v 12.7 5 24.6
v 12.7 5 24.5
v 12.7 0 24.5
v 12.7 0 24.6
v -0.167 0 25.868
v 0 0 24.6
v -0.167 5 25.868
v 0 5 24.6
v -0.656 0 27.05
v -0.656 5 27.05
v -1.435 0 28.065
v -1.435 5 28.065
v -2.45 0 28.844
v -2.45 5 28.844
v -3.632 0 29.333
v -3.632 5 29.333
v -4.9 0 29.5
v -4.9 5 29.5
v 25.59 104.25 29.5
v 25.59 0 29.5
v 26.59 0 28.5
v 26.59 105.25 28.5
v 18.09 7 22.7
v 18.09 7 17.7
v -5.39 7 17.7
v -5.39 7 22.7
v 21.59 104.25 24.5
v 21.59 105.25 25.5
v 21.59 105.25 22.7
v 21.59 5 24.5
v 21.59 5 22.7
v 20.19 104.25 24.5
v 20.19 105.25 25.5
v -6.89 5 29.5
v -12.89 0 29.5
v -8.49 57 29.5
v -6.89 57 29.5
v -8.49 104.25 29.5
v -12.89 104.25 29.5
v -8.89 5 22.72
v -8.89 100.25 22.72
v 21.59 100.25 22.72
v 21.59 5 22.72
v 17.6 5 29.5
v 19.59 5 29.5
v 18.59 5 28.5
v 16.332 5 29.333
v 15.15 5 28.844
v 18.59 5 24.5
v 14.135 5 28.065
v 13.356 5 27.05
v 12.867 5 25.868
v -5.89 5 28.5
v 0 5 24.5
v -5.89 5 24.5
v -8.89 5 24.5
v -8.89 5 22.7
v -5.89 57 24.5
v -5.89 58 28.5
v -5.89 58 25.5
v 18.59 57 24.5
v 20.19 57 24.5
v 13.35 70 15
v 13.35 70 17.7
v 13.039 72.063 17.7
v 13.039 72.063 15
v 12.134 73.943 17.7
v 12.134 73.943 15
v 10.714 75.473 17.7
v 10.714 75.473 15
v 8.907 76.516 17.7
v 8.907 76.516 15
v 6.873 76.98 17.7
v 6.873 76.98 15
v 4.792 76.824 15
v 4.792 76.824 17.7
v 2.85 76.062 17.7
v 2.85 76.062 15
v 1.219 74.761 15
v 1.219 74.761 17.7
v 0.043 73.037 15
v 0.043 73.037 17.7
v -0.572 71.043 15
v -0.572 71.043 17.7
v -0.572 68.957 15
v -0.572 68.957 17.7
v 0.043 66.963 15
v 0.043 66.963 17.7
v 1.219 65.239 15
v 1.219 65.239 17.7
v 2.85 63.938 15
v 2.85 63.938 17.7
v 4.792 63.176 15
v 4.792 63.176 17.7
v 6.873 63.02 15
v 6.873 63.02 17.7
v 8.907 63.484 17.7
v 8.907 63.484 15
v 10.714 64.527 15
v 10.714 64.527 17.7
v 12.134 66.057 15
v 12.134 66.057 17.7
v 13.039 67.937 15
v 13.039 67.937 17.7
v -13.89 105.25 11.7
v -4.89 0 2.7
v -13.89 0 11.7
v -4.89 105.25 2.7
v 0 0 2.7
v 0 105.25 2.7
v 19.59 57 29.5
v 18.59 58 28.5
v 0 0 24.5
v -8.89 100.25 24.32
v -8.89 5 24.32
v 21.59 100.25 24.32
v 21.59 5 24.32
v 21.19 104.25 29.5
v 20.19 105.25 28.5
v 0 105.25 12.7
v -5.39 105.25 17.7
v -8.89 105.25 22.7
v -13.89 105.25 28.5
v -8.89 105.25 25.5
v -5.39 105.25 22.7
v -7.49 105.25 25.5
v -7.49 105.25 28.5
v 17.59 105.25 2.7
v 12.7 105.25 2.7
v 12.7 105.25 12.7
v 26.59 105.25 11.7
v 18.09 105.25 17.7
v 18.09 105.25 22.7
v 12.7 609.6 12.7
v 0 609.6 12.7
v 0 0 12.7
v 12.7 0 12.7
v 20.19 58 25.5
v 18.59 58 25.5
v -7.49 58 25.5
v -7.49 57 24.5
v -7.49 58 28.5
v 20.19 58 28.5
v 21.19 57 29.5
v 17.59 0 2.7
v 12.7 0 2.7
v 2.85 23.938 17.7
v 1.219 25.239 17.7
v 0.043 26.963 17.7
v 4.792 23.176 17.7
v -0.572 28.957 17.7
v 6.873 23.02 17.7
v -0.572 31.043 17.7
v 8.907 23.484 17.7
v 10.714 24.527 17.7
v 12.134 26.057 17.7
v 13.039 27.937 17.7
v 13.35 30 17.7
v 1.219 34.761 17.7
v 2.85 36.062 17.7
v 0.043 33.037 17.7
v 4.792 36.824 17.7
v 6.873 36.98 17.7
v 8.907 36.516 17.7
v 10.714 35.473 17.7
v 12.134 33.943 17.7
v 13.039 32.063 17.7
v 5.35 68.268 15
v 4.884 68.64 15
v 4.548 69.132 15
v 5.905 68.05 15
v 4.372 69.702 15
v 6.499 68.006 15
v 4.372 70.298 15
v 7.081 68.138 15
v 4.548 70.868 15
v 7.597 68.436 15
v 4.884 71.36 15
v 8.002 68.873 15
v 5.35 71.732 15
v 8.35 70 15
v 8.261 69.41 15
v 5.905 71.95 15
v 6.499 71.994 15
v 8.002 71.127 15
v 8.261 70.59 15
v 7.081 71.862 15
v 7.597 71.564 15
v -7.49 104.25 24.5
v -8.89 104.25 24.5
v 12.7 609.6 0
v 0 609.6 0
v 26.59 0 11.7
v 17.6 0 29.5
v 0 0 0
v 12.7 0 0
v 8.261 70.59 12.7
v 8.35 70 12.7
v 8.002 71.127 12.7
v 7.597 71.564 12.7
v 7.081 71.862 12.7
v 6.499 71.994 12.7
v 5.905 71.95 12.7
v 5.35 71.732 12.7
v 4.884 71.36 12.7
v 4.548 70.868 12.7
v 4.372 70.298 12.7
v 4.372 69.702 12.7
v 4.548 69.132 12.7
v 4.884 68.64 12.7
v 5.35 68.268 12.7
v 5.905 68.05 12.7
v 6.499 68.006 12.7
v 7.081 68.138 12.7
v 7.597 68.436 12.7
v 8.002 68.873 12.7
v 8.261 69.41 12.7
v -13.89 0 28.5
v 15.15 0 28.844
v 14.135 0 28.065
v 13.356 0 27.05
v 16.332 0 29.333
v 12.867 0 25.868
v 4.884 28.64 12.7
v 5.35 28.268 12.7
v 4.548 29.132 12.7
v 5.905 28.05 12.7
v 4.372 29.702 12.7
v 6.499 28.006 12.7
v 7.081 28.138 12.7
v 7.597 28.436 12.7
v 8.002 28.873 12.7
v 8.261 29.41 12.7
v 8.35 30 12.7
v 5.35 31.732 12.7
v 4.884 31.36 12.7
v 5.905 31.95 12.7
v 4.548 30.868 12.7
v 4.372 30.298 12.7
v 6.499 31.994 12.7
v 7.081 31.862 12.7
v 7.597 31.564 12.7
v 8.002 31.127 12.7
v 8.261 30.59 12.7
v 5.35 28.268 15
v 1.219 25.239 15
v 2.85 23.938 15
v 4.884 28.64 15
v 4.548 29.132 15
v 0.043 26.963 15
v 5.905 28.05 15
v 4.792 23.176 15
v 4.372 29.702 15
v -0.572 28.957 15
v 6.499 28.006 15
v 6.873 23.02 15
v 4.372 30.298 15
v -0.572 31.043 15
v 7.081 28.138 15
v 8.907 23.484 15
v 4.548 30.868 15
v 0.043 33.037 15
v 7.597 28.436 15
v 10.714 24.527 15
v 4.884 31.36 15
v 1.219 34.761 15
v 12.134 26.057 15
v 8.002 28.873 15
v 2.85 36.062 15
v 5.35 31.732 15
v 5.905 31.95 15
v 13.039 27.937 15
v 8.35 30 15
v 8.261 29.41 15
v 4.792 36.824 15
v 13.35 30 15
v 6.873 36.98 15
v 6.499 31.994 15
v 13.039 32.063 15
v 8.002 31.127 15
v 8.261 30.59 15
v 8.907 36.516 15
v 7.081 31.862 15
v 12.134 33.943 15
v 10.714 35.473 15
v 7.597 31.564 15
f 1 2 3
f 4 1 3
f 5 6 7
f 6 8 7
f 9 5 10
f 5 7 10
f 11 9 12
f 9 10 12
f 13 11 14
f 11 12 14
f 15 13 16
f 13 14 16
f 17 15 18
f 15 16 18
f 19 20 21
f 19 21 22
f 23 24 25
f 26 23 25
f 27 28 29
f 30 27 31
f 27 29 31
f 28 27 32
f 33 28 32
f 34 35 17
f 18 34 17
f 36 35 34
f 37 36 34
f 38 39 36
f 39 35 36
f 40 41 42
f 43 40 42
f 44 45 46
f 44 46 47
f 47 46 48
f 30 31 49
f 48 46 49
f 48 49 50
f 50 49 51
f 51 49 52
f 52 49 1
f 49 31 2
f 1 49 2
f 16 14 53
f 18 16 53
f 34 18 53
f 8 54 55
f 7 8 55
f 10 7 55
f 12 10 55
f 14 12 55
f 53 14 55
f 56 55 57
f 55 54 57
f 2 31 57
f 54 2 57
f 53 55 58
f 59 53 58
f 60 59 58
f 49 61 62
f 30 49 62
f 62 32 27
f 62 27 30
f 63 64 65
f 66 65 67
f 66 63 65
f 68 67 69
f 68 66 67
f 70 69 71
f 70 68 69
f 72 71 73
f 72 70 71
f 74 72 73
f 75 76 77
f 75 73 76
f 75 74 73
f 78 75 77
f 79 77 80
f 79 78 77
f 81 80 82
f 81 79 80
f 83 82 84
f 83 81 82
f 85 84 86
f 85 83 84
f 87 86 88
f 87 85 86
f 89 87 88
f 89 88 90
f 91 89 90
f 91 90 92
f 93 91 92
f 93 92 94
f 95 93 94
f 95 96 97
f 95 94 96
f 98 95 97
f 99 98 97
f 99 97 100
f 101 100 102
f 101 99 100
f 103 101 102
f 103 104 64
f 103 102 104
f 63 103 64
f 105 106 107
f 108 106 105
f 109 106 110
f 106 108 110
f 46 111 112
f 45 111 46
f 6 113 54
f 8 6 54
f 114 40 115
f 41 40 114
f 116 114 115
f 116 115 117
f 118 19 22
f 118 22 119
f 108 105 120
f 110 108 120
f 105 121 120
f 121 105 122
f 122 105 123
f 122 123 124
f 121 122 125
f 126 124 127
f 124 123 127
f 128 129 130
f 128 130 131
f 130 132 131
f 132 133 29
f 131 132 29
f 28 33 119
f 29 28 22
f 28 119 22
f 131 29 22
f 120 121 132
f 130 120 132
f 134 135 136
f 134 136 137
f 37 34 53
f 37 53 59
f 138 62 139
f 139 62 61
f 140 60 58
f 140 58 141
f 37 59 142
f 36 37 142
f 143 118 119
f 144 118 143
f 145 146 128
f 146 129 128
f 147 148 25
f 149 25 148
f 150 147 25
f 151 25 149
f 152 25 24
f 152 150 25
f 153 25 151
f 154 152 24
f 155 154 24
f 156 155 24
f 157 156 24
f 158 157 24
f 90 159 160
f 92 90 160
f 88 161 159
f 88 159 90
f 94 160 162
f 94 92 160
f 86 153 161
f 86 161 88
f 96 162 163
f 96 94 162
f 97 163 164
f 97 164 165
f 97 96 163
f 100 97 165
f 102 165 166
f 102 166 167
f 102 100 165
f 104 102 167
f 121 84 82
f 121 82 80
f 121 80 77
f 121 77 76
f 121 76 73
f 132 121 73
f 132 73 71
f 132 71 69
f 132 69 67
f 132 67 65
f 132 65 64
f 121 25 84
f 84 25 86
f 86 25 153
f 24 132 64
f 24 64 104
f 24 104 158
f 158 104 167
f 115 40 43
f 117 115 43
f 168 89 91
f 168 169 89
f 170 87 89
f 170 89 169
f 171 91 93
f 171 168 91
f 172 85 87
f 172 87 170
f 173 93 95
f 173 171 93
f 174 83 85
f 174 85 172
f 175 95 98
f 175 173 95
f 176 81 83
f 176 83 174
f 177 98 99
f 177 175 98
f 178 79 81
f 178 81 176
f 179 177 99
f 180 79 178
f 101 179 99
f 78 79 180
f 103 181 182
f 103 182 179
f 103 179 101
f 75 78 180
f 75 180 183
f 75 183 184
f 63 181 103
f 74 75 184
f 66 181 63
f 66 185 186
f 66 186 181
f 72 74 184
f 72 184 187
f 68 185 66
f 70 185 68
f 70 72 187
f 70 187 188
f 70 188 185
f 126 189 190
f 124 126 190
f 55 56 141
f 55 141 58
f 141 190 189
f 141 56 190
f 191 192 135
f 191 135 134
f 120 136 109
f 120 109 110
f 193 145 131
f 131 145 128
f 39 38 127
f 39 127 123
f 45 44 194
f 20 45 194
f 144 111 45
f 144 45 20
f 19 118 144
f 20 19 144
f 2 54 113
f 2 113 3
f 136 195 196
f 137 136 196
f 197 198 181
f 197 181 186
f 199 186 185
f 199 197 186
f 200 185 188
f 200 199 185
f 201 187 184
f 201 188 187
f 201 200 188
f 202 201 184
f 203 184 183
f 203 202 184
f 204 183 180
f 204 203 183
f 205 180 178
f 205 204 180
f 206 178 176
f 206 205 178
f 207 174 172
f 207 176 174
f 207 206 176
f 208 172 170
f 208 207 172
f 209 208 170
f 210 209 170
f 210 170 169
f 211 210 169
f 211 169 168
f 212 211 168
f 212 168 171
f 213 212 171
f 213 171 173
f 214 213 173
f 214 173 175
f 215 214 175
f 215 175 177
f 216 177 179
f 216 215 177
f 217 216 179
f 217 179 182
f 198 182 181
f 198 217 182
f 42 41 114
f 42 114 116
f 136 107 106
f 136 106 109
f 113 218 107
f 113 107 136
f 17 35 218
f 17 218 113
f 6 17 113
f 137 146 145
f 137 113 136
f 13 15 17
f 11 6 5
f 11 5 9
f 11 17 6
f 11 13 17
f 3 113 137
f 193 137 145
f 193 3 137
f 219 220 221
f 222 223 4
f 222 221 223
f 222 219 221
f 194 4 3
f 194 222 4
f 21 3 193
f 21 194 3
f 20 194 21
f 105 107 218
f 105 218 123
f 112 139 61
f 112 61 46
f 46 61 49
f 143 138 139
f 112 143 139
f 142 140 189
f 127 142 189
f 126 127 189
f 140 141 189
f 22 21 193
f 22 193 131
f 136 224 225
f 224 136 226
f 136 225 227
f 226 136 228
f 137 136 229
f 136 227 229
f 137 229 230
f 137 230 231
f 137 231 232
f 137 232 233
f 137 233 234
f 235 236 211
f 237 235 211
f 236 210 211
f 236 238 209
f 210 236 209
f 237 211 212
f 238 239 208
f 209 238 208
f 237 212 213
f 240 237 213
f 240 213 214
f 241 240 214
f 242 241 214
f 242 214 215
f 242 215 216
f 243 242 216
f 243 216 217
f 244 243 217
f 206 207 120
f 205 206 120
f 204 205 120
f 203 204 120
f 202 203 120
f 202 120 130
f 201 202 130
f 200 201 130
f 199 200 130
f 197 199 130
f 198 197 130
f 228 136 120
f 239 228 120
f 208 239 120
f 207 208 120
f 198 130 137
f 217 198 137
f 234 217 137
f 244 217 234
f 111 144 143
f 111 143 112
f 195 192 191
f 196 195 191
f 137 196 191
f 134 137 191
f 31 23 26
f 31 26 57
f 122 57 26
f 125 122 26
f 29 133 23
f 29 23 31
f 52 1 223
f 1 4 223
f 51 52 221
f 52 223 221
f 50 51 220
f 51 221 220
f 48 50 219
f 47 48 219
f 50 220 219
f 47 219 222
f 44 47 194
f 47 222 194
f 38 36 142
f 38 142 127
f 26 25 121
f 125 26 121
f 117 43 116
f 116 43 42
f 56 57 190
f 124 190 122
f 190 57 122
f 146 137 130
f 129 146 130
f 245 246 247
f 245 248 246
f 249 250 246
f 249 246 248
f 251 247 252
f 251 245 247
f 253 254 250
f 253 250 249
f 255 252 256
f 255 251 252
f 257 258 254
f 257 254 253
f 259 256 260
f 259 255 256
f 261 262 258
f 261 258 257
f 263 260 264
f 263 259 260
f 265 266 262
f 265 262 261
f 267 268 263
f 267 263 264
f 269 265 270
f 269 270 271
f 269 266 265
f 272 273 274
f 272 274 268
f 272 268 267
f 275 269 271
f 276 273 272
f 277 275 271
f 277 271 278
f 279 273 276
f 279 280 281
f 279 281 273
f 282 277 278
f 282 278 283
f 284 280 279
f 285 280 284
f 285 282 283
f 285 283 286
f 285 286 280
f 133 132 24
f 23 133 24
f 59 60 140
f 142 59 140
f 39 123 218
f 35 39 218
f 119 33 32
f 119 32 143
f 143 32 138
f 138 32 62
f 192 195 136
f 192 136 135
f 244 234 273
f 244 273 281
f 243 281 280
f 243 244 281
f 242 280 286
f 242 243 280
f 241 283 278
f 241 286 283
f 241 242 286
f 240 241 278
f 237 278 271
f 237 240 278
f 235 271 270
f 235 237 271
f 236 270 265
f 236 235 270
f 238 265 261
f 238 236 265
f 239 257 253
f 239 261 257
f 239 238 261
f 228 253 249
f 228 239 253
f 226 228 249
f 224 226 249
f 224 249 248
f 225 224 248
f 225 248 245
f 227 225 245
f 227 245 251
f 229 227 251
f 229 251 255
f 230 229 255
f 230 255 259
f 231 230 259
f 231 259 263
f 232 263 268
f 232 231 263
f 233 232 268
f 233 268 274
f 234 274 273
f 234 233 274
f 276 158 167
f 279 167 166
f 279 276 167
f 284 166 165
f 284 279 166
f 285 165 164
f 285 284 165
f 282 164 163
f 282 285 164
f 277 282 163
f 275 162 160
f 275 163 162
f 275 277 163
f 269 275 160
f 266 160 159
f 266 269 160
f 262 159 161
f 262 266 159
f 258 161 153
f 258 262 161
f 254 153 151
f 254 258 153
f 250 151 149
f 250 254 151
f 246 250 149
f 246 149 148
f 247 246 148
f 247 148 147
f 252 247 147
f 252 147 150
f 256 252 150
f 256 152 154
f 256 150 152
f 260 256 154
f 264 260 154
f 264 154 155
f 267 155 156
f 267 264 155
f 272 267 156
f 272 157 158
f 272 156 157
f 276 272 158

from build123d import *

# Parameters (mm, degrees)
BOX_W             = 12.7
BOX_H             = 609.6
BOX_DEPTH         = 12.7
BOX001_W          = 30.48
BOX001_H          = 95.25
BOX001_DEPTH      = 1.6
CYLINDER002_R     = 7
CYLINDER002_DEPTH = 3
CYLINDER003_R     = 7
CYLINDER003_DEPTH = 3
CYLINDER001_R     = 2
CYLINDER001_DEPTH = 10
CYLINDER_R        = 2
CYLINDER_DEPTH    = 10
SKETCH_W          = 40.48
SKETCH_H          = 105.25
EXTRUDE_DEPTH     = 5
SKETCH001_W       = 13.89
SKETCH001_H       = 105.25
EXTRUDE001_DEPTH  = 10
CHAMFER_SIZE      = 9
EXTRUDE002_DEPTH  = 5
EXTRUDE003_DEPTH  = 1.8
EXTRUDE004_DEPTH  = 5
CHAMFER001_SIZE   = 1
FILLET_R          = 4.9
CHAMFER002_SIZE   = 1
CHAMFER003_SIZE   = 1


with BuildPart() as dowel:
    # Box → Box (new body)
    with BuildSketch(Plane.XY):
        with Locations((6.35, 304.8)):
            Rectangle(BOX_W, BOX_H)
    extrude(amount=BOX_DEPTH)


with BuildPart() as pcb:
    # Box001 → Box001 (new body)
    with BuildSketch(Plane(origin=(-8.89, 5, 22.72), x_dir=(1, 0, 0), z_dir=(0, 0, 1))):
        with Locations((15.24, 47.625)):
            Rectangle(BOX001_W, BOX001_H)
    extrude(amount=BOX001_DEPTH)


with BuildPart() as countersink1:
    # Cylinder002 → Cylinder002 (new body)
    with BuildSketch(Plane(origin=(6.35, 30, 15), x_dir=(1, 0, 0), z_dir=(0, 0, 1))):
        Circle(CYLINDER002_R)
    extrude(amount=CYLINDER002_DEPTH)


with BuildPart() as countersink002:
    # Cylinder003 → Cylinder003 (new body)
    with BuildSketch(Plane(origin=(6.35, 70, 15), x_dir=(1, 0, 0), z_dir=(0, 0, 1))):
        Circle(CYLINDER003_R)
    extrude(amount=CYLINDER003_DEPTH)


with BuildPart() as screwhole2:
    # Cylinder001 → Cylinder001 (new body)
    with BuildSketch(Plane(origin=(6.35, 70, 10), x_dir=(1, 0, 0), z_dir=(0, 0, 1))):
        Circle(CYLINDER001_R)
    extrude(amount=CYLINDER001_DEPTH)


with BuildPart() as screwhole1:
    # Cylinder → Cylinder (new body)
    with BuildSketch(Plane(origin=(6.35, 30, 10), x_dir=(1, 0, 0), z_dir=(0, 0, 1))):
        Circle(CYLINDER_R)
    extrude(amount=CYLINDER_DEPTH)


with BuildPart() as baseplate:
    # Sketch → Extrude (new body)
    with BuildSketch(Plane.XY):
        with Locations((0, 52.625)):
            Rectangle(SKETCH_W, SKETCH_H)
    extrude(amount=EXTRUDE_DEPTH)


with BuildPart() as baseplate_1:
    # Extrude placement: moved
    add(baseplate.part.moved(Location((6.35, 0, 12.7))))

    # Cut: cut screwhole1
    add(screwhole1.part, mode=Mode.SUBTRACT)

    # Cut001: cut screwhole2
    add(screwhole2.part, mode=Mode.SUBTRACT)

    # Cut002: cut countersink002
    add(countersink002.part, mode=Mode.SUBTRACT)

    # Cut003: cut countersink1
    add(countersink1.part, mode=Mode.SUBTRACT)


with BuildPart() as supportarms:
    # Sketch001 (on Extrude) → Extrude001 (new body)
    with BuildSketch(Plane(origin=(6.35, 0, 12.7), x_dir=(1, 0, 0), z_dir=(0, 0, 1))):
        with Locations((-13.295, 52.625)):
            Rectangle(SKETCH001_W, SKETCH001_H)
        with Locations((13.295, 52.625)):
            Rectangle(SKETCH001_W, SKETCH001_H)
    extrude(amount=-EXTRUDE001_DEPTH)

    # Chamfer
    chamfer_edges = [supportarms.edges().sort_by_distance(p)[0] for p in [
        (26.59, 52.625, 2.7),
        (-13.89, 52.625, 2.7),
    ]]
    chamfer(chamfer_edges, length=CHAMFER_SIZE)


with BuildPart() as pcbarmsa:
    # Sketch002 (on Face5 of Cut003) → Extrude002 (new body)
    with BuildSketch(Plane.XY.offset(17.7)):
        Polygon((-13.89, 0), (-8.89, 0), (21.59, 0), (26.59, 0), (26.59, 105.25), (18.09, 105.25), (18.09, 7), (-5.39, 7), (-5.39, 105.25), (-13.89, 105.25), align=None)
    extrude(amount=EXTRUDE002_DEPTH)


with BuildPart() as pcbarmsb:
    # Sketch003 (on Face12 of Extrude002) → Extrude003 (new body)
    with BuildSketch(Plane.XY.offset(22.7)):
        Polygon((-13.89, 0), (26.59, 0), (26.59, 5), (26.59, 105.25), (21.59, 105.25), (21.59, 5), (-8.89, 5), (-8.89, 105.25), (-13.89, 105.25), (-13.89, 5), align=None)
    extrude(amount=EXTRUDE003_DEPTH)


with BuildPart() as fusion001:
    # Sketch004 (on Face12 of Extrude003) → Extrude004 (new body)
    with BuildSketch(Plane.XY.offset(24.5)):
        Polygon((-7.49, 105.25), (-13.89, 105.25), (-13.89, 0), (0, 0), (0, 5), (-5.89, 5), (-5.89, 58), (-7.49, 58), align=None)
        Polygon((26.59, 0), (26.59, 105.25), (20.19, 105.25), (20.19, 58), (18.59, 58), (18.59, 5), (12.7, 5), (12.7, 0), (18.59, 0), align=None)
    extrude(amount=EXTRUDE004_DEPTH)

    # Fusion: union PCBArmsA, PCBArmsB
    add(pcbarmsa.part)
    add(pcbarmsb.part)

    # Chamfer001
    chamfer001_edges = [fusion001.edges().sort_by_distance(p)[0] for p in [
        (-10.69, 105.25, 29.5),
        (-13.89, 52.625, 29.5),
        (-7.49, 81.625, 29.5),
        (-5.89, 31.5, 29.5),
        (-6.69, 58, 29.5),
        (26.59, 52.625, 29.5),
        (23.39, 105.25, 29.5),
        (18.59, 31.5, 29.5),
        (19.39, 58, 29.5),
        (20.19, 81.625, 29.5),
    ]]
    chamfer(chamfer001_edges, length=CHAMFER001_SIZE)

    # Fillet
    fillet_edges = [fusion001.edges().sort_by_distance(p)[0] for p in [
        (0, 2.5, 29.5),
        (12.7, 2.5, 29.5),
    ]]
    fillet(fillet_edges, radius=FILLET_R)

    # Chamfer002
    chamfer002_edges = [fusion001.edges().sort_by_distance(p)[0] for p in [
        (-8.19, 105.25, 24.5),
        (-6.69, 58, 24.5),
    ]]
    chamfer(chamfer002_edges, length=CHAMFER002_SIZE)

    # Chamfer003
    chamfer003_edges = [fusion001.edges().sort_by_distance(p)[0] for p in [
        (19.39, 58, 24.5),
        (20.89, 105.25, 24.5),
    ]]
    chamfer(chamfer003_edges, length=CHAMFER003_SIZE)

    # Fusion001: union Baseplate, SupportArms
    add(baseplate_1.part)
    add(supportarms.part)


solid = Compound([dowel.part, pcb.part, fusion001.part])
